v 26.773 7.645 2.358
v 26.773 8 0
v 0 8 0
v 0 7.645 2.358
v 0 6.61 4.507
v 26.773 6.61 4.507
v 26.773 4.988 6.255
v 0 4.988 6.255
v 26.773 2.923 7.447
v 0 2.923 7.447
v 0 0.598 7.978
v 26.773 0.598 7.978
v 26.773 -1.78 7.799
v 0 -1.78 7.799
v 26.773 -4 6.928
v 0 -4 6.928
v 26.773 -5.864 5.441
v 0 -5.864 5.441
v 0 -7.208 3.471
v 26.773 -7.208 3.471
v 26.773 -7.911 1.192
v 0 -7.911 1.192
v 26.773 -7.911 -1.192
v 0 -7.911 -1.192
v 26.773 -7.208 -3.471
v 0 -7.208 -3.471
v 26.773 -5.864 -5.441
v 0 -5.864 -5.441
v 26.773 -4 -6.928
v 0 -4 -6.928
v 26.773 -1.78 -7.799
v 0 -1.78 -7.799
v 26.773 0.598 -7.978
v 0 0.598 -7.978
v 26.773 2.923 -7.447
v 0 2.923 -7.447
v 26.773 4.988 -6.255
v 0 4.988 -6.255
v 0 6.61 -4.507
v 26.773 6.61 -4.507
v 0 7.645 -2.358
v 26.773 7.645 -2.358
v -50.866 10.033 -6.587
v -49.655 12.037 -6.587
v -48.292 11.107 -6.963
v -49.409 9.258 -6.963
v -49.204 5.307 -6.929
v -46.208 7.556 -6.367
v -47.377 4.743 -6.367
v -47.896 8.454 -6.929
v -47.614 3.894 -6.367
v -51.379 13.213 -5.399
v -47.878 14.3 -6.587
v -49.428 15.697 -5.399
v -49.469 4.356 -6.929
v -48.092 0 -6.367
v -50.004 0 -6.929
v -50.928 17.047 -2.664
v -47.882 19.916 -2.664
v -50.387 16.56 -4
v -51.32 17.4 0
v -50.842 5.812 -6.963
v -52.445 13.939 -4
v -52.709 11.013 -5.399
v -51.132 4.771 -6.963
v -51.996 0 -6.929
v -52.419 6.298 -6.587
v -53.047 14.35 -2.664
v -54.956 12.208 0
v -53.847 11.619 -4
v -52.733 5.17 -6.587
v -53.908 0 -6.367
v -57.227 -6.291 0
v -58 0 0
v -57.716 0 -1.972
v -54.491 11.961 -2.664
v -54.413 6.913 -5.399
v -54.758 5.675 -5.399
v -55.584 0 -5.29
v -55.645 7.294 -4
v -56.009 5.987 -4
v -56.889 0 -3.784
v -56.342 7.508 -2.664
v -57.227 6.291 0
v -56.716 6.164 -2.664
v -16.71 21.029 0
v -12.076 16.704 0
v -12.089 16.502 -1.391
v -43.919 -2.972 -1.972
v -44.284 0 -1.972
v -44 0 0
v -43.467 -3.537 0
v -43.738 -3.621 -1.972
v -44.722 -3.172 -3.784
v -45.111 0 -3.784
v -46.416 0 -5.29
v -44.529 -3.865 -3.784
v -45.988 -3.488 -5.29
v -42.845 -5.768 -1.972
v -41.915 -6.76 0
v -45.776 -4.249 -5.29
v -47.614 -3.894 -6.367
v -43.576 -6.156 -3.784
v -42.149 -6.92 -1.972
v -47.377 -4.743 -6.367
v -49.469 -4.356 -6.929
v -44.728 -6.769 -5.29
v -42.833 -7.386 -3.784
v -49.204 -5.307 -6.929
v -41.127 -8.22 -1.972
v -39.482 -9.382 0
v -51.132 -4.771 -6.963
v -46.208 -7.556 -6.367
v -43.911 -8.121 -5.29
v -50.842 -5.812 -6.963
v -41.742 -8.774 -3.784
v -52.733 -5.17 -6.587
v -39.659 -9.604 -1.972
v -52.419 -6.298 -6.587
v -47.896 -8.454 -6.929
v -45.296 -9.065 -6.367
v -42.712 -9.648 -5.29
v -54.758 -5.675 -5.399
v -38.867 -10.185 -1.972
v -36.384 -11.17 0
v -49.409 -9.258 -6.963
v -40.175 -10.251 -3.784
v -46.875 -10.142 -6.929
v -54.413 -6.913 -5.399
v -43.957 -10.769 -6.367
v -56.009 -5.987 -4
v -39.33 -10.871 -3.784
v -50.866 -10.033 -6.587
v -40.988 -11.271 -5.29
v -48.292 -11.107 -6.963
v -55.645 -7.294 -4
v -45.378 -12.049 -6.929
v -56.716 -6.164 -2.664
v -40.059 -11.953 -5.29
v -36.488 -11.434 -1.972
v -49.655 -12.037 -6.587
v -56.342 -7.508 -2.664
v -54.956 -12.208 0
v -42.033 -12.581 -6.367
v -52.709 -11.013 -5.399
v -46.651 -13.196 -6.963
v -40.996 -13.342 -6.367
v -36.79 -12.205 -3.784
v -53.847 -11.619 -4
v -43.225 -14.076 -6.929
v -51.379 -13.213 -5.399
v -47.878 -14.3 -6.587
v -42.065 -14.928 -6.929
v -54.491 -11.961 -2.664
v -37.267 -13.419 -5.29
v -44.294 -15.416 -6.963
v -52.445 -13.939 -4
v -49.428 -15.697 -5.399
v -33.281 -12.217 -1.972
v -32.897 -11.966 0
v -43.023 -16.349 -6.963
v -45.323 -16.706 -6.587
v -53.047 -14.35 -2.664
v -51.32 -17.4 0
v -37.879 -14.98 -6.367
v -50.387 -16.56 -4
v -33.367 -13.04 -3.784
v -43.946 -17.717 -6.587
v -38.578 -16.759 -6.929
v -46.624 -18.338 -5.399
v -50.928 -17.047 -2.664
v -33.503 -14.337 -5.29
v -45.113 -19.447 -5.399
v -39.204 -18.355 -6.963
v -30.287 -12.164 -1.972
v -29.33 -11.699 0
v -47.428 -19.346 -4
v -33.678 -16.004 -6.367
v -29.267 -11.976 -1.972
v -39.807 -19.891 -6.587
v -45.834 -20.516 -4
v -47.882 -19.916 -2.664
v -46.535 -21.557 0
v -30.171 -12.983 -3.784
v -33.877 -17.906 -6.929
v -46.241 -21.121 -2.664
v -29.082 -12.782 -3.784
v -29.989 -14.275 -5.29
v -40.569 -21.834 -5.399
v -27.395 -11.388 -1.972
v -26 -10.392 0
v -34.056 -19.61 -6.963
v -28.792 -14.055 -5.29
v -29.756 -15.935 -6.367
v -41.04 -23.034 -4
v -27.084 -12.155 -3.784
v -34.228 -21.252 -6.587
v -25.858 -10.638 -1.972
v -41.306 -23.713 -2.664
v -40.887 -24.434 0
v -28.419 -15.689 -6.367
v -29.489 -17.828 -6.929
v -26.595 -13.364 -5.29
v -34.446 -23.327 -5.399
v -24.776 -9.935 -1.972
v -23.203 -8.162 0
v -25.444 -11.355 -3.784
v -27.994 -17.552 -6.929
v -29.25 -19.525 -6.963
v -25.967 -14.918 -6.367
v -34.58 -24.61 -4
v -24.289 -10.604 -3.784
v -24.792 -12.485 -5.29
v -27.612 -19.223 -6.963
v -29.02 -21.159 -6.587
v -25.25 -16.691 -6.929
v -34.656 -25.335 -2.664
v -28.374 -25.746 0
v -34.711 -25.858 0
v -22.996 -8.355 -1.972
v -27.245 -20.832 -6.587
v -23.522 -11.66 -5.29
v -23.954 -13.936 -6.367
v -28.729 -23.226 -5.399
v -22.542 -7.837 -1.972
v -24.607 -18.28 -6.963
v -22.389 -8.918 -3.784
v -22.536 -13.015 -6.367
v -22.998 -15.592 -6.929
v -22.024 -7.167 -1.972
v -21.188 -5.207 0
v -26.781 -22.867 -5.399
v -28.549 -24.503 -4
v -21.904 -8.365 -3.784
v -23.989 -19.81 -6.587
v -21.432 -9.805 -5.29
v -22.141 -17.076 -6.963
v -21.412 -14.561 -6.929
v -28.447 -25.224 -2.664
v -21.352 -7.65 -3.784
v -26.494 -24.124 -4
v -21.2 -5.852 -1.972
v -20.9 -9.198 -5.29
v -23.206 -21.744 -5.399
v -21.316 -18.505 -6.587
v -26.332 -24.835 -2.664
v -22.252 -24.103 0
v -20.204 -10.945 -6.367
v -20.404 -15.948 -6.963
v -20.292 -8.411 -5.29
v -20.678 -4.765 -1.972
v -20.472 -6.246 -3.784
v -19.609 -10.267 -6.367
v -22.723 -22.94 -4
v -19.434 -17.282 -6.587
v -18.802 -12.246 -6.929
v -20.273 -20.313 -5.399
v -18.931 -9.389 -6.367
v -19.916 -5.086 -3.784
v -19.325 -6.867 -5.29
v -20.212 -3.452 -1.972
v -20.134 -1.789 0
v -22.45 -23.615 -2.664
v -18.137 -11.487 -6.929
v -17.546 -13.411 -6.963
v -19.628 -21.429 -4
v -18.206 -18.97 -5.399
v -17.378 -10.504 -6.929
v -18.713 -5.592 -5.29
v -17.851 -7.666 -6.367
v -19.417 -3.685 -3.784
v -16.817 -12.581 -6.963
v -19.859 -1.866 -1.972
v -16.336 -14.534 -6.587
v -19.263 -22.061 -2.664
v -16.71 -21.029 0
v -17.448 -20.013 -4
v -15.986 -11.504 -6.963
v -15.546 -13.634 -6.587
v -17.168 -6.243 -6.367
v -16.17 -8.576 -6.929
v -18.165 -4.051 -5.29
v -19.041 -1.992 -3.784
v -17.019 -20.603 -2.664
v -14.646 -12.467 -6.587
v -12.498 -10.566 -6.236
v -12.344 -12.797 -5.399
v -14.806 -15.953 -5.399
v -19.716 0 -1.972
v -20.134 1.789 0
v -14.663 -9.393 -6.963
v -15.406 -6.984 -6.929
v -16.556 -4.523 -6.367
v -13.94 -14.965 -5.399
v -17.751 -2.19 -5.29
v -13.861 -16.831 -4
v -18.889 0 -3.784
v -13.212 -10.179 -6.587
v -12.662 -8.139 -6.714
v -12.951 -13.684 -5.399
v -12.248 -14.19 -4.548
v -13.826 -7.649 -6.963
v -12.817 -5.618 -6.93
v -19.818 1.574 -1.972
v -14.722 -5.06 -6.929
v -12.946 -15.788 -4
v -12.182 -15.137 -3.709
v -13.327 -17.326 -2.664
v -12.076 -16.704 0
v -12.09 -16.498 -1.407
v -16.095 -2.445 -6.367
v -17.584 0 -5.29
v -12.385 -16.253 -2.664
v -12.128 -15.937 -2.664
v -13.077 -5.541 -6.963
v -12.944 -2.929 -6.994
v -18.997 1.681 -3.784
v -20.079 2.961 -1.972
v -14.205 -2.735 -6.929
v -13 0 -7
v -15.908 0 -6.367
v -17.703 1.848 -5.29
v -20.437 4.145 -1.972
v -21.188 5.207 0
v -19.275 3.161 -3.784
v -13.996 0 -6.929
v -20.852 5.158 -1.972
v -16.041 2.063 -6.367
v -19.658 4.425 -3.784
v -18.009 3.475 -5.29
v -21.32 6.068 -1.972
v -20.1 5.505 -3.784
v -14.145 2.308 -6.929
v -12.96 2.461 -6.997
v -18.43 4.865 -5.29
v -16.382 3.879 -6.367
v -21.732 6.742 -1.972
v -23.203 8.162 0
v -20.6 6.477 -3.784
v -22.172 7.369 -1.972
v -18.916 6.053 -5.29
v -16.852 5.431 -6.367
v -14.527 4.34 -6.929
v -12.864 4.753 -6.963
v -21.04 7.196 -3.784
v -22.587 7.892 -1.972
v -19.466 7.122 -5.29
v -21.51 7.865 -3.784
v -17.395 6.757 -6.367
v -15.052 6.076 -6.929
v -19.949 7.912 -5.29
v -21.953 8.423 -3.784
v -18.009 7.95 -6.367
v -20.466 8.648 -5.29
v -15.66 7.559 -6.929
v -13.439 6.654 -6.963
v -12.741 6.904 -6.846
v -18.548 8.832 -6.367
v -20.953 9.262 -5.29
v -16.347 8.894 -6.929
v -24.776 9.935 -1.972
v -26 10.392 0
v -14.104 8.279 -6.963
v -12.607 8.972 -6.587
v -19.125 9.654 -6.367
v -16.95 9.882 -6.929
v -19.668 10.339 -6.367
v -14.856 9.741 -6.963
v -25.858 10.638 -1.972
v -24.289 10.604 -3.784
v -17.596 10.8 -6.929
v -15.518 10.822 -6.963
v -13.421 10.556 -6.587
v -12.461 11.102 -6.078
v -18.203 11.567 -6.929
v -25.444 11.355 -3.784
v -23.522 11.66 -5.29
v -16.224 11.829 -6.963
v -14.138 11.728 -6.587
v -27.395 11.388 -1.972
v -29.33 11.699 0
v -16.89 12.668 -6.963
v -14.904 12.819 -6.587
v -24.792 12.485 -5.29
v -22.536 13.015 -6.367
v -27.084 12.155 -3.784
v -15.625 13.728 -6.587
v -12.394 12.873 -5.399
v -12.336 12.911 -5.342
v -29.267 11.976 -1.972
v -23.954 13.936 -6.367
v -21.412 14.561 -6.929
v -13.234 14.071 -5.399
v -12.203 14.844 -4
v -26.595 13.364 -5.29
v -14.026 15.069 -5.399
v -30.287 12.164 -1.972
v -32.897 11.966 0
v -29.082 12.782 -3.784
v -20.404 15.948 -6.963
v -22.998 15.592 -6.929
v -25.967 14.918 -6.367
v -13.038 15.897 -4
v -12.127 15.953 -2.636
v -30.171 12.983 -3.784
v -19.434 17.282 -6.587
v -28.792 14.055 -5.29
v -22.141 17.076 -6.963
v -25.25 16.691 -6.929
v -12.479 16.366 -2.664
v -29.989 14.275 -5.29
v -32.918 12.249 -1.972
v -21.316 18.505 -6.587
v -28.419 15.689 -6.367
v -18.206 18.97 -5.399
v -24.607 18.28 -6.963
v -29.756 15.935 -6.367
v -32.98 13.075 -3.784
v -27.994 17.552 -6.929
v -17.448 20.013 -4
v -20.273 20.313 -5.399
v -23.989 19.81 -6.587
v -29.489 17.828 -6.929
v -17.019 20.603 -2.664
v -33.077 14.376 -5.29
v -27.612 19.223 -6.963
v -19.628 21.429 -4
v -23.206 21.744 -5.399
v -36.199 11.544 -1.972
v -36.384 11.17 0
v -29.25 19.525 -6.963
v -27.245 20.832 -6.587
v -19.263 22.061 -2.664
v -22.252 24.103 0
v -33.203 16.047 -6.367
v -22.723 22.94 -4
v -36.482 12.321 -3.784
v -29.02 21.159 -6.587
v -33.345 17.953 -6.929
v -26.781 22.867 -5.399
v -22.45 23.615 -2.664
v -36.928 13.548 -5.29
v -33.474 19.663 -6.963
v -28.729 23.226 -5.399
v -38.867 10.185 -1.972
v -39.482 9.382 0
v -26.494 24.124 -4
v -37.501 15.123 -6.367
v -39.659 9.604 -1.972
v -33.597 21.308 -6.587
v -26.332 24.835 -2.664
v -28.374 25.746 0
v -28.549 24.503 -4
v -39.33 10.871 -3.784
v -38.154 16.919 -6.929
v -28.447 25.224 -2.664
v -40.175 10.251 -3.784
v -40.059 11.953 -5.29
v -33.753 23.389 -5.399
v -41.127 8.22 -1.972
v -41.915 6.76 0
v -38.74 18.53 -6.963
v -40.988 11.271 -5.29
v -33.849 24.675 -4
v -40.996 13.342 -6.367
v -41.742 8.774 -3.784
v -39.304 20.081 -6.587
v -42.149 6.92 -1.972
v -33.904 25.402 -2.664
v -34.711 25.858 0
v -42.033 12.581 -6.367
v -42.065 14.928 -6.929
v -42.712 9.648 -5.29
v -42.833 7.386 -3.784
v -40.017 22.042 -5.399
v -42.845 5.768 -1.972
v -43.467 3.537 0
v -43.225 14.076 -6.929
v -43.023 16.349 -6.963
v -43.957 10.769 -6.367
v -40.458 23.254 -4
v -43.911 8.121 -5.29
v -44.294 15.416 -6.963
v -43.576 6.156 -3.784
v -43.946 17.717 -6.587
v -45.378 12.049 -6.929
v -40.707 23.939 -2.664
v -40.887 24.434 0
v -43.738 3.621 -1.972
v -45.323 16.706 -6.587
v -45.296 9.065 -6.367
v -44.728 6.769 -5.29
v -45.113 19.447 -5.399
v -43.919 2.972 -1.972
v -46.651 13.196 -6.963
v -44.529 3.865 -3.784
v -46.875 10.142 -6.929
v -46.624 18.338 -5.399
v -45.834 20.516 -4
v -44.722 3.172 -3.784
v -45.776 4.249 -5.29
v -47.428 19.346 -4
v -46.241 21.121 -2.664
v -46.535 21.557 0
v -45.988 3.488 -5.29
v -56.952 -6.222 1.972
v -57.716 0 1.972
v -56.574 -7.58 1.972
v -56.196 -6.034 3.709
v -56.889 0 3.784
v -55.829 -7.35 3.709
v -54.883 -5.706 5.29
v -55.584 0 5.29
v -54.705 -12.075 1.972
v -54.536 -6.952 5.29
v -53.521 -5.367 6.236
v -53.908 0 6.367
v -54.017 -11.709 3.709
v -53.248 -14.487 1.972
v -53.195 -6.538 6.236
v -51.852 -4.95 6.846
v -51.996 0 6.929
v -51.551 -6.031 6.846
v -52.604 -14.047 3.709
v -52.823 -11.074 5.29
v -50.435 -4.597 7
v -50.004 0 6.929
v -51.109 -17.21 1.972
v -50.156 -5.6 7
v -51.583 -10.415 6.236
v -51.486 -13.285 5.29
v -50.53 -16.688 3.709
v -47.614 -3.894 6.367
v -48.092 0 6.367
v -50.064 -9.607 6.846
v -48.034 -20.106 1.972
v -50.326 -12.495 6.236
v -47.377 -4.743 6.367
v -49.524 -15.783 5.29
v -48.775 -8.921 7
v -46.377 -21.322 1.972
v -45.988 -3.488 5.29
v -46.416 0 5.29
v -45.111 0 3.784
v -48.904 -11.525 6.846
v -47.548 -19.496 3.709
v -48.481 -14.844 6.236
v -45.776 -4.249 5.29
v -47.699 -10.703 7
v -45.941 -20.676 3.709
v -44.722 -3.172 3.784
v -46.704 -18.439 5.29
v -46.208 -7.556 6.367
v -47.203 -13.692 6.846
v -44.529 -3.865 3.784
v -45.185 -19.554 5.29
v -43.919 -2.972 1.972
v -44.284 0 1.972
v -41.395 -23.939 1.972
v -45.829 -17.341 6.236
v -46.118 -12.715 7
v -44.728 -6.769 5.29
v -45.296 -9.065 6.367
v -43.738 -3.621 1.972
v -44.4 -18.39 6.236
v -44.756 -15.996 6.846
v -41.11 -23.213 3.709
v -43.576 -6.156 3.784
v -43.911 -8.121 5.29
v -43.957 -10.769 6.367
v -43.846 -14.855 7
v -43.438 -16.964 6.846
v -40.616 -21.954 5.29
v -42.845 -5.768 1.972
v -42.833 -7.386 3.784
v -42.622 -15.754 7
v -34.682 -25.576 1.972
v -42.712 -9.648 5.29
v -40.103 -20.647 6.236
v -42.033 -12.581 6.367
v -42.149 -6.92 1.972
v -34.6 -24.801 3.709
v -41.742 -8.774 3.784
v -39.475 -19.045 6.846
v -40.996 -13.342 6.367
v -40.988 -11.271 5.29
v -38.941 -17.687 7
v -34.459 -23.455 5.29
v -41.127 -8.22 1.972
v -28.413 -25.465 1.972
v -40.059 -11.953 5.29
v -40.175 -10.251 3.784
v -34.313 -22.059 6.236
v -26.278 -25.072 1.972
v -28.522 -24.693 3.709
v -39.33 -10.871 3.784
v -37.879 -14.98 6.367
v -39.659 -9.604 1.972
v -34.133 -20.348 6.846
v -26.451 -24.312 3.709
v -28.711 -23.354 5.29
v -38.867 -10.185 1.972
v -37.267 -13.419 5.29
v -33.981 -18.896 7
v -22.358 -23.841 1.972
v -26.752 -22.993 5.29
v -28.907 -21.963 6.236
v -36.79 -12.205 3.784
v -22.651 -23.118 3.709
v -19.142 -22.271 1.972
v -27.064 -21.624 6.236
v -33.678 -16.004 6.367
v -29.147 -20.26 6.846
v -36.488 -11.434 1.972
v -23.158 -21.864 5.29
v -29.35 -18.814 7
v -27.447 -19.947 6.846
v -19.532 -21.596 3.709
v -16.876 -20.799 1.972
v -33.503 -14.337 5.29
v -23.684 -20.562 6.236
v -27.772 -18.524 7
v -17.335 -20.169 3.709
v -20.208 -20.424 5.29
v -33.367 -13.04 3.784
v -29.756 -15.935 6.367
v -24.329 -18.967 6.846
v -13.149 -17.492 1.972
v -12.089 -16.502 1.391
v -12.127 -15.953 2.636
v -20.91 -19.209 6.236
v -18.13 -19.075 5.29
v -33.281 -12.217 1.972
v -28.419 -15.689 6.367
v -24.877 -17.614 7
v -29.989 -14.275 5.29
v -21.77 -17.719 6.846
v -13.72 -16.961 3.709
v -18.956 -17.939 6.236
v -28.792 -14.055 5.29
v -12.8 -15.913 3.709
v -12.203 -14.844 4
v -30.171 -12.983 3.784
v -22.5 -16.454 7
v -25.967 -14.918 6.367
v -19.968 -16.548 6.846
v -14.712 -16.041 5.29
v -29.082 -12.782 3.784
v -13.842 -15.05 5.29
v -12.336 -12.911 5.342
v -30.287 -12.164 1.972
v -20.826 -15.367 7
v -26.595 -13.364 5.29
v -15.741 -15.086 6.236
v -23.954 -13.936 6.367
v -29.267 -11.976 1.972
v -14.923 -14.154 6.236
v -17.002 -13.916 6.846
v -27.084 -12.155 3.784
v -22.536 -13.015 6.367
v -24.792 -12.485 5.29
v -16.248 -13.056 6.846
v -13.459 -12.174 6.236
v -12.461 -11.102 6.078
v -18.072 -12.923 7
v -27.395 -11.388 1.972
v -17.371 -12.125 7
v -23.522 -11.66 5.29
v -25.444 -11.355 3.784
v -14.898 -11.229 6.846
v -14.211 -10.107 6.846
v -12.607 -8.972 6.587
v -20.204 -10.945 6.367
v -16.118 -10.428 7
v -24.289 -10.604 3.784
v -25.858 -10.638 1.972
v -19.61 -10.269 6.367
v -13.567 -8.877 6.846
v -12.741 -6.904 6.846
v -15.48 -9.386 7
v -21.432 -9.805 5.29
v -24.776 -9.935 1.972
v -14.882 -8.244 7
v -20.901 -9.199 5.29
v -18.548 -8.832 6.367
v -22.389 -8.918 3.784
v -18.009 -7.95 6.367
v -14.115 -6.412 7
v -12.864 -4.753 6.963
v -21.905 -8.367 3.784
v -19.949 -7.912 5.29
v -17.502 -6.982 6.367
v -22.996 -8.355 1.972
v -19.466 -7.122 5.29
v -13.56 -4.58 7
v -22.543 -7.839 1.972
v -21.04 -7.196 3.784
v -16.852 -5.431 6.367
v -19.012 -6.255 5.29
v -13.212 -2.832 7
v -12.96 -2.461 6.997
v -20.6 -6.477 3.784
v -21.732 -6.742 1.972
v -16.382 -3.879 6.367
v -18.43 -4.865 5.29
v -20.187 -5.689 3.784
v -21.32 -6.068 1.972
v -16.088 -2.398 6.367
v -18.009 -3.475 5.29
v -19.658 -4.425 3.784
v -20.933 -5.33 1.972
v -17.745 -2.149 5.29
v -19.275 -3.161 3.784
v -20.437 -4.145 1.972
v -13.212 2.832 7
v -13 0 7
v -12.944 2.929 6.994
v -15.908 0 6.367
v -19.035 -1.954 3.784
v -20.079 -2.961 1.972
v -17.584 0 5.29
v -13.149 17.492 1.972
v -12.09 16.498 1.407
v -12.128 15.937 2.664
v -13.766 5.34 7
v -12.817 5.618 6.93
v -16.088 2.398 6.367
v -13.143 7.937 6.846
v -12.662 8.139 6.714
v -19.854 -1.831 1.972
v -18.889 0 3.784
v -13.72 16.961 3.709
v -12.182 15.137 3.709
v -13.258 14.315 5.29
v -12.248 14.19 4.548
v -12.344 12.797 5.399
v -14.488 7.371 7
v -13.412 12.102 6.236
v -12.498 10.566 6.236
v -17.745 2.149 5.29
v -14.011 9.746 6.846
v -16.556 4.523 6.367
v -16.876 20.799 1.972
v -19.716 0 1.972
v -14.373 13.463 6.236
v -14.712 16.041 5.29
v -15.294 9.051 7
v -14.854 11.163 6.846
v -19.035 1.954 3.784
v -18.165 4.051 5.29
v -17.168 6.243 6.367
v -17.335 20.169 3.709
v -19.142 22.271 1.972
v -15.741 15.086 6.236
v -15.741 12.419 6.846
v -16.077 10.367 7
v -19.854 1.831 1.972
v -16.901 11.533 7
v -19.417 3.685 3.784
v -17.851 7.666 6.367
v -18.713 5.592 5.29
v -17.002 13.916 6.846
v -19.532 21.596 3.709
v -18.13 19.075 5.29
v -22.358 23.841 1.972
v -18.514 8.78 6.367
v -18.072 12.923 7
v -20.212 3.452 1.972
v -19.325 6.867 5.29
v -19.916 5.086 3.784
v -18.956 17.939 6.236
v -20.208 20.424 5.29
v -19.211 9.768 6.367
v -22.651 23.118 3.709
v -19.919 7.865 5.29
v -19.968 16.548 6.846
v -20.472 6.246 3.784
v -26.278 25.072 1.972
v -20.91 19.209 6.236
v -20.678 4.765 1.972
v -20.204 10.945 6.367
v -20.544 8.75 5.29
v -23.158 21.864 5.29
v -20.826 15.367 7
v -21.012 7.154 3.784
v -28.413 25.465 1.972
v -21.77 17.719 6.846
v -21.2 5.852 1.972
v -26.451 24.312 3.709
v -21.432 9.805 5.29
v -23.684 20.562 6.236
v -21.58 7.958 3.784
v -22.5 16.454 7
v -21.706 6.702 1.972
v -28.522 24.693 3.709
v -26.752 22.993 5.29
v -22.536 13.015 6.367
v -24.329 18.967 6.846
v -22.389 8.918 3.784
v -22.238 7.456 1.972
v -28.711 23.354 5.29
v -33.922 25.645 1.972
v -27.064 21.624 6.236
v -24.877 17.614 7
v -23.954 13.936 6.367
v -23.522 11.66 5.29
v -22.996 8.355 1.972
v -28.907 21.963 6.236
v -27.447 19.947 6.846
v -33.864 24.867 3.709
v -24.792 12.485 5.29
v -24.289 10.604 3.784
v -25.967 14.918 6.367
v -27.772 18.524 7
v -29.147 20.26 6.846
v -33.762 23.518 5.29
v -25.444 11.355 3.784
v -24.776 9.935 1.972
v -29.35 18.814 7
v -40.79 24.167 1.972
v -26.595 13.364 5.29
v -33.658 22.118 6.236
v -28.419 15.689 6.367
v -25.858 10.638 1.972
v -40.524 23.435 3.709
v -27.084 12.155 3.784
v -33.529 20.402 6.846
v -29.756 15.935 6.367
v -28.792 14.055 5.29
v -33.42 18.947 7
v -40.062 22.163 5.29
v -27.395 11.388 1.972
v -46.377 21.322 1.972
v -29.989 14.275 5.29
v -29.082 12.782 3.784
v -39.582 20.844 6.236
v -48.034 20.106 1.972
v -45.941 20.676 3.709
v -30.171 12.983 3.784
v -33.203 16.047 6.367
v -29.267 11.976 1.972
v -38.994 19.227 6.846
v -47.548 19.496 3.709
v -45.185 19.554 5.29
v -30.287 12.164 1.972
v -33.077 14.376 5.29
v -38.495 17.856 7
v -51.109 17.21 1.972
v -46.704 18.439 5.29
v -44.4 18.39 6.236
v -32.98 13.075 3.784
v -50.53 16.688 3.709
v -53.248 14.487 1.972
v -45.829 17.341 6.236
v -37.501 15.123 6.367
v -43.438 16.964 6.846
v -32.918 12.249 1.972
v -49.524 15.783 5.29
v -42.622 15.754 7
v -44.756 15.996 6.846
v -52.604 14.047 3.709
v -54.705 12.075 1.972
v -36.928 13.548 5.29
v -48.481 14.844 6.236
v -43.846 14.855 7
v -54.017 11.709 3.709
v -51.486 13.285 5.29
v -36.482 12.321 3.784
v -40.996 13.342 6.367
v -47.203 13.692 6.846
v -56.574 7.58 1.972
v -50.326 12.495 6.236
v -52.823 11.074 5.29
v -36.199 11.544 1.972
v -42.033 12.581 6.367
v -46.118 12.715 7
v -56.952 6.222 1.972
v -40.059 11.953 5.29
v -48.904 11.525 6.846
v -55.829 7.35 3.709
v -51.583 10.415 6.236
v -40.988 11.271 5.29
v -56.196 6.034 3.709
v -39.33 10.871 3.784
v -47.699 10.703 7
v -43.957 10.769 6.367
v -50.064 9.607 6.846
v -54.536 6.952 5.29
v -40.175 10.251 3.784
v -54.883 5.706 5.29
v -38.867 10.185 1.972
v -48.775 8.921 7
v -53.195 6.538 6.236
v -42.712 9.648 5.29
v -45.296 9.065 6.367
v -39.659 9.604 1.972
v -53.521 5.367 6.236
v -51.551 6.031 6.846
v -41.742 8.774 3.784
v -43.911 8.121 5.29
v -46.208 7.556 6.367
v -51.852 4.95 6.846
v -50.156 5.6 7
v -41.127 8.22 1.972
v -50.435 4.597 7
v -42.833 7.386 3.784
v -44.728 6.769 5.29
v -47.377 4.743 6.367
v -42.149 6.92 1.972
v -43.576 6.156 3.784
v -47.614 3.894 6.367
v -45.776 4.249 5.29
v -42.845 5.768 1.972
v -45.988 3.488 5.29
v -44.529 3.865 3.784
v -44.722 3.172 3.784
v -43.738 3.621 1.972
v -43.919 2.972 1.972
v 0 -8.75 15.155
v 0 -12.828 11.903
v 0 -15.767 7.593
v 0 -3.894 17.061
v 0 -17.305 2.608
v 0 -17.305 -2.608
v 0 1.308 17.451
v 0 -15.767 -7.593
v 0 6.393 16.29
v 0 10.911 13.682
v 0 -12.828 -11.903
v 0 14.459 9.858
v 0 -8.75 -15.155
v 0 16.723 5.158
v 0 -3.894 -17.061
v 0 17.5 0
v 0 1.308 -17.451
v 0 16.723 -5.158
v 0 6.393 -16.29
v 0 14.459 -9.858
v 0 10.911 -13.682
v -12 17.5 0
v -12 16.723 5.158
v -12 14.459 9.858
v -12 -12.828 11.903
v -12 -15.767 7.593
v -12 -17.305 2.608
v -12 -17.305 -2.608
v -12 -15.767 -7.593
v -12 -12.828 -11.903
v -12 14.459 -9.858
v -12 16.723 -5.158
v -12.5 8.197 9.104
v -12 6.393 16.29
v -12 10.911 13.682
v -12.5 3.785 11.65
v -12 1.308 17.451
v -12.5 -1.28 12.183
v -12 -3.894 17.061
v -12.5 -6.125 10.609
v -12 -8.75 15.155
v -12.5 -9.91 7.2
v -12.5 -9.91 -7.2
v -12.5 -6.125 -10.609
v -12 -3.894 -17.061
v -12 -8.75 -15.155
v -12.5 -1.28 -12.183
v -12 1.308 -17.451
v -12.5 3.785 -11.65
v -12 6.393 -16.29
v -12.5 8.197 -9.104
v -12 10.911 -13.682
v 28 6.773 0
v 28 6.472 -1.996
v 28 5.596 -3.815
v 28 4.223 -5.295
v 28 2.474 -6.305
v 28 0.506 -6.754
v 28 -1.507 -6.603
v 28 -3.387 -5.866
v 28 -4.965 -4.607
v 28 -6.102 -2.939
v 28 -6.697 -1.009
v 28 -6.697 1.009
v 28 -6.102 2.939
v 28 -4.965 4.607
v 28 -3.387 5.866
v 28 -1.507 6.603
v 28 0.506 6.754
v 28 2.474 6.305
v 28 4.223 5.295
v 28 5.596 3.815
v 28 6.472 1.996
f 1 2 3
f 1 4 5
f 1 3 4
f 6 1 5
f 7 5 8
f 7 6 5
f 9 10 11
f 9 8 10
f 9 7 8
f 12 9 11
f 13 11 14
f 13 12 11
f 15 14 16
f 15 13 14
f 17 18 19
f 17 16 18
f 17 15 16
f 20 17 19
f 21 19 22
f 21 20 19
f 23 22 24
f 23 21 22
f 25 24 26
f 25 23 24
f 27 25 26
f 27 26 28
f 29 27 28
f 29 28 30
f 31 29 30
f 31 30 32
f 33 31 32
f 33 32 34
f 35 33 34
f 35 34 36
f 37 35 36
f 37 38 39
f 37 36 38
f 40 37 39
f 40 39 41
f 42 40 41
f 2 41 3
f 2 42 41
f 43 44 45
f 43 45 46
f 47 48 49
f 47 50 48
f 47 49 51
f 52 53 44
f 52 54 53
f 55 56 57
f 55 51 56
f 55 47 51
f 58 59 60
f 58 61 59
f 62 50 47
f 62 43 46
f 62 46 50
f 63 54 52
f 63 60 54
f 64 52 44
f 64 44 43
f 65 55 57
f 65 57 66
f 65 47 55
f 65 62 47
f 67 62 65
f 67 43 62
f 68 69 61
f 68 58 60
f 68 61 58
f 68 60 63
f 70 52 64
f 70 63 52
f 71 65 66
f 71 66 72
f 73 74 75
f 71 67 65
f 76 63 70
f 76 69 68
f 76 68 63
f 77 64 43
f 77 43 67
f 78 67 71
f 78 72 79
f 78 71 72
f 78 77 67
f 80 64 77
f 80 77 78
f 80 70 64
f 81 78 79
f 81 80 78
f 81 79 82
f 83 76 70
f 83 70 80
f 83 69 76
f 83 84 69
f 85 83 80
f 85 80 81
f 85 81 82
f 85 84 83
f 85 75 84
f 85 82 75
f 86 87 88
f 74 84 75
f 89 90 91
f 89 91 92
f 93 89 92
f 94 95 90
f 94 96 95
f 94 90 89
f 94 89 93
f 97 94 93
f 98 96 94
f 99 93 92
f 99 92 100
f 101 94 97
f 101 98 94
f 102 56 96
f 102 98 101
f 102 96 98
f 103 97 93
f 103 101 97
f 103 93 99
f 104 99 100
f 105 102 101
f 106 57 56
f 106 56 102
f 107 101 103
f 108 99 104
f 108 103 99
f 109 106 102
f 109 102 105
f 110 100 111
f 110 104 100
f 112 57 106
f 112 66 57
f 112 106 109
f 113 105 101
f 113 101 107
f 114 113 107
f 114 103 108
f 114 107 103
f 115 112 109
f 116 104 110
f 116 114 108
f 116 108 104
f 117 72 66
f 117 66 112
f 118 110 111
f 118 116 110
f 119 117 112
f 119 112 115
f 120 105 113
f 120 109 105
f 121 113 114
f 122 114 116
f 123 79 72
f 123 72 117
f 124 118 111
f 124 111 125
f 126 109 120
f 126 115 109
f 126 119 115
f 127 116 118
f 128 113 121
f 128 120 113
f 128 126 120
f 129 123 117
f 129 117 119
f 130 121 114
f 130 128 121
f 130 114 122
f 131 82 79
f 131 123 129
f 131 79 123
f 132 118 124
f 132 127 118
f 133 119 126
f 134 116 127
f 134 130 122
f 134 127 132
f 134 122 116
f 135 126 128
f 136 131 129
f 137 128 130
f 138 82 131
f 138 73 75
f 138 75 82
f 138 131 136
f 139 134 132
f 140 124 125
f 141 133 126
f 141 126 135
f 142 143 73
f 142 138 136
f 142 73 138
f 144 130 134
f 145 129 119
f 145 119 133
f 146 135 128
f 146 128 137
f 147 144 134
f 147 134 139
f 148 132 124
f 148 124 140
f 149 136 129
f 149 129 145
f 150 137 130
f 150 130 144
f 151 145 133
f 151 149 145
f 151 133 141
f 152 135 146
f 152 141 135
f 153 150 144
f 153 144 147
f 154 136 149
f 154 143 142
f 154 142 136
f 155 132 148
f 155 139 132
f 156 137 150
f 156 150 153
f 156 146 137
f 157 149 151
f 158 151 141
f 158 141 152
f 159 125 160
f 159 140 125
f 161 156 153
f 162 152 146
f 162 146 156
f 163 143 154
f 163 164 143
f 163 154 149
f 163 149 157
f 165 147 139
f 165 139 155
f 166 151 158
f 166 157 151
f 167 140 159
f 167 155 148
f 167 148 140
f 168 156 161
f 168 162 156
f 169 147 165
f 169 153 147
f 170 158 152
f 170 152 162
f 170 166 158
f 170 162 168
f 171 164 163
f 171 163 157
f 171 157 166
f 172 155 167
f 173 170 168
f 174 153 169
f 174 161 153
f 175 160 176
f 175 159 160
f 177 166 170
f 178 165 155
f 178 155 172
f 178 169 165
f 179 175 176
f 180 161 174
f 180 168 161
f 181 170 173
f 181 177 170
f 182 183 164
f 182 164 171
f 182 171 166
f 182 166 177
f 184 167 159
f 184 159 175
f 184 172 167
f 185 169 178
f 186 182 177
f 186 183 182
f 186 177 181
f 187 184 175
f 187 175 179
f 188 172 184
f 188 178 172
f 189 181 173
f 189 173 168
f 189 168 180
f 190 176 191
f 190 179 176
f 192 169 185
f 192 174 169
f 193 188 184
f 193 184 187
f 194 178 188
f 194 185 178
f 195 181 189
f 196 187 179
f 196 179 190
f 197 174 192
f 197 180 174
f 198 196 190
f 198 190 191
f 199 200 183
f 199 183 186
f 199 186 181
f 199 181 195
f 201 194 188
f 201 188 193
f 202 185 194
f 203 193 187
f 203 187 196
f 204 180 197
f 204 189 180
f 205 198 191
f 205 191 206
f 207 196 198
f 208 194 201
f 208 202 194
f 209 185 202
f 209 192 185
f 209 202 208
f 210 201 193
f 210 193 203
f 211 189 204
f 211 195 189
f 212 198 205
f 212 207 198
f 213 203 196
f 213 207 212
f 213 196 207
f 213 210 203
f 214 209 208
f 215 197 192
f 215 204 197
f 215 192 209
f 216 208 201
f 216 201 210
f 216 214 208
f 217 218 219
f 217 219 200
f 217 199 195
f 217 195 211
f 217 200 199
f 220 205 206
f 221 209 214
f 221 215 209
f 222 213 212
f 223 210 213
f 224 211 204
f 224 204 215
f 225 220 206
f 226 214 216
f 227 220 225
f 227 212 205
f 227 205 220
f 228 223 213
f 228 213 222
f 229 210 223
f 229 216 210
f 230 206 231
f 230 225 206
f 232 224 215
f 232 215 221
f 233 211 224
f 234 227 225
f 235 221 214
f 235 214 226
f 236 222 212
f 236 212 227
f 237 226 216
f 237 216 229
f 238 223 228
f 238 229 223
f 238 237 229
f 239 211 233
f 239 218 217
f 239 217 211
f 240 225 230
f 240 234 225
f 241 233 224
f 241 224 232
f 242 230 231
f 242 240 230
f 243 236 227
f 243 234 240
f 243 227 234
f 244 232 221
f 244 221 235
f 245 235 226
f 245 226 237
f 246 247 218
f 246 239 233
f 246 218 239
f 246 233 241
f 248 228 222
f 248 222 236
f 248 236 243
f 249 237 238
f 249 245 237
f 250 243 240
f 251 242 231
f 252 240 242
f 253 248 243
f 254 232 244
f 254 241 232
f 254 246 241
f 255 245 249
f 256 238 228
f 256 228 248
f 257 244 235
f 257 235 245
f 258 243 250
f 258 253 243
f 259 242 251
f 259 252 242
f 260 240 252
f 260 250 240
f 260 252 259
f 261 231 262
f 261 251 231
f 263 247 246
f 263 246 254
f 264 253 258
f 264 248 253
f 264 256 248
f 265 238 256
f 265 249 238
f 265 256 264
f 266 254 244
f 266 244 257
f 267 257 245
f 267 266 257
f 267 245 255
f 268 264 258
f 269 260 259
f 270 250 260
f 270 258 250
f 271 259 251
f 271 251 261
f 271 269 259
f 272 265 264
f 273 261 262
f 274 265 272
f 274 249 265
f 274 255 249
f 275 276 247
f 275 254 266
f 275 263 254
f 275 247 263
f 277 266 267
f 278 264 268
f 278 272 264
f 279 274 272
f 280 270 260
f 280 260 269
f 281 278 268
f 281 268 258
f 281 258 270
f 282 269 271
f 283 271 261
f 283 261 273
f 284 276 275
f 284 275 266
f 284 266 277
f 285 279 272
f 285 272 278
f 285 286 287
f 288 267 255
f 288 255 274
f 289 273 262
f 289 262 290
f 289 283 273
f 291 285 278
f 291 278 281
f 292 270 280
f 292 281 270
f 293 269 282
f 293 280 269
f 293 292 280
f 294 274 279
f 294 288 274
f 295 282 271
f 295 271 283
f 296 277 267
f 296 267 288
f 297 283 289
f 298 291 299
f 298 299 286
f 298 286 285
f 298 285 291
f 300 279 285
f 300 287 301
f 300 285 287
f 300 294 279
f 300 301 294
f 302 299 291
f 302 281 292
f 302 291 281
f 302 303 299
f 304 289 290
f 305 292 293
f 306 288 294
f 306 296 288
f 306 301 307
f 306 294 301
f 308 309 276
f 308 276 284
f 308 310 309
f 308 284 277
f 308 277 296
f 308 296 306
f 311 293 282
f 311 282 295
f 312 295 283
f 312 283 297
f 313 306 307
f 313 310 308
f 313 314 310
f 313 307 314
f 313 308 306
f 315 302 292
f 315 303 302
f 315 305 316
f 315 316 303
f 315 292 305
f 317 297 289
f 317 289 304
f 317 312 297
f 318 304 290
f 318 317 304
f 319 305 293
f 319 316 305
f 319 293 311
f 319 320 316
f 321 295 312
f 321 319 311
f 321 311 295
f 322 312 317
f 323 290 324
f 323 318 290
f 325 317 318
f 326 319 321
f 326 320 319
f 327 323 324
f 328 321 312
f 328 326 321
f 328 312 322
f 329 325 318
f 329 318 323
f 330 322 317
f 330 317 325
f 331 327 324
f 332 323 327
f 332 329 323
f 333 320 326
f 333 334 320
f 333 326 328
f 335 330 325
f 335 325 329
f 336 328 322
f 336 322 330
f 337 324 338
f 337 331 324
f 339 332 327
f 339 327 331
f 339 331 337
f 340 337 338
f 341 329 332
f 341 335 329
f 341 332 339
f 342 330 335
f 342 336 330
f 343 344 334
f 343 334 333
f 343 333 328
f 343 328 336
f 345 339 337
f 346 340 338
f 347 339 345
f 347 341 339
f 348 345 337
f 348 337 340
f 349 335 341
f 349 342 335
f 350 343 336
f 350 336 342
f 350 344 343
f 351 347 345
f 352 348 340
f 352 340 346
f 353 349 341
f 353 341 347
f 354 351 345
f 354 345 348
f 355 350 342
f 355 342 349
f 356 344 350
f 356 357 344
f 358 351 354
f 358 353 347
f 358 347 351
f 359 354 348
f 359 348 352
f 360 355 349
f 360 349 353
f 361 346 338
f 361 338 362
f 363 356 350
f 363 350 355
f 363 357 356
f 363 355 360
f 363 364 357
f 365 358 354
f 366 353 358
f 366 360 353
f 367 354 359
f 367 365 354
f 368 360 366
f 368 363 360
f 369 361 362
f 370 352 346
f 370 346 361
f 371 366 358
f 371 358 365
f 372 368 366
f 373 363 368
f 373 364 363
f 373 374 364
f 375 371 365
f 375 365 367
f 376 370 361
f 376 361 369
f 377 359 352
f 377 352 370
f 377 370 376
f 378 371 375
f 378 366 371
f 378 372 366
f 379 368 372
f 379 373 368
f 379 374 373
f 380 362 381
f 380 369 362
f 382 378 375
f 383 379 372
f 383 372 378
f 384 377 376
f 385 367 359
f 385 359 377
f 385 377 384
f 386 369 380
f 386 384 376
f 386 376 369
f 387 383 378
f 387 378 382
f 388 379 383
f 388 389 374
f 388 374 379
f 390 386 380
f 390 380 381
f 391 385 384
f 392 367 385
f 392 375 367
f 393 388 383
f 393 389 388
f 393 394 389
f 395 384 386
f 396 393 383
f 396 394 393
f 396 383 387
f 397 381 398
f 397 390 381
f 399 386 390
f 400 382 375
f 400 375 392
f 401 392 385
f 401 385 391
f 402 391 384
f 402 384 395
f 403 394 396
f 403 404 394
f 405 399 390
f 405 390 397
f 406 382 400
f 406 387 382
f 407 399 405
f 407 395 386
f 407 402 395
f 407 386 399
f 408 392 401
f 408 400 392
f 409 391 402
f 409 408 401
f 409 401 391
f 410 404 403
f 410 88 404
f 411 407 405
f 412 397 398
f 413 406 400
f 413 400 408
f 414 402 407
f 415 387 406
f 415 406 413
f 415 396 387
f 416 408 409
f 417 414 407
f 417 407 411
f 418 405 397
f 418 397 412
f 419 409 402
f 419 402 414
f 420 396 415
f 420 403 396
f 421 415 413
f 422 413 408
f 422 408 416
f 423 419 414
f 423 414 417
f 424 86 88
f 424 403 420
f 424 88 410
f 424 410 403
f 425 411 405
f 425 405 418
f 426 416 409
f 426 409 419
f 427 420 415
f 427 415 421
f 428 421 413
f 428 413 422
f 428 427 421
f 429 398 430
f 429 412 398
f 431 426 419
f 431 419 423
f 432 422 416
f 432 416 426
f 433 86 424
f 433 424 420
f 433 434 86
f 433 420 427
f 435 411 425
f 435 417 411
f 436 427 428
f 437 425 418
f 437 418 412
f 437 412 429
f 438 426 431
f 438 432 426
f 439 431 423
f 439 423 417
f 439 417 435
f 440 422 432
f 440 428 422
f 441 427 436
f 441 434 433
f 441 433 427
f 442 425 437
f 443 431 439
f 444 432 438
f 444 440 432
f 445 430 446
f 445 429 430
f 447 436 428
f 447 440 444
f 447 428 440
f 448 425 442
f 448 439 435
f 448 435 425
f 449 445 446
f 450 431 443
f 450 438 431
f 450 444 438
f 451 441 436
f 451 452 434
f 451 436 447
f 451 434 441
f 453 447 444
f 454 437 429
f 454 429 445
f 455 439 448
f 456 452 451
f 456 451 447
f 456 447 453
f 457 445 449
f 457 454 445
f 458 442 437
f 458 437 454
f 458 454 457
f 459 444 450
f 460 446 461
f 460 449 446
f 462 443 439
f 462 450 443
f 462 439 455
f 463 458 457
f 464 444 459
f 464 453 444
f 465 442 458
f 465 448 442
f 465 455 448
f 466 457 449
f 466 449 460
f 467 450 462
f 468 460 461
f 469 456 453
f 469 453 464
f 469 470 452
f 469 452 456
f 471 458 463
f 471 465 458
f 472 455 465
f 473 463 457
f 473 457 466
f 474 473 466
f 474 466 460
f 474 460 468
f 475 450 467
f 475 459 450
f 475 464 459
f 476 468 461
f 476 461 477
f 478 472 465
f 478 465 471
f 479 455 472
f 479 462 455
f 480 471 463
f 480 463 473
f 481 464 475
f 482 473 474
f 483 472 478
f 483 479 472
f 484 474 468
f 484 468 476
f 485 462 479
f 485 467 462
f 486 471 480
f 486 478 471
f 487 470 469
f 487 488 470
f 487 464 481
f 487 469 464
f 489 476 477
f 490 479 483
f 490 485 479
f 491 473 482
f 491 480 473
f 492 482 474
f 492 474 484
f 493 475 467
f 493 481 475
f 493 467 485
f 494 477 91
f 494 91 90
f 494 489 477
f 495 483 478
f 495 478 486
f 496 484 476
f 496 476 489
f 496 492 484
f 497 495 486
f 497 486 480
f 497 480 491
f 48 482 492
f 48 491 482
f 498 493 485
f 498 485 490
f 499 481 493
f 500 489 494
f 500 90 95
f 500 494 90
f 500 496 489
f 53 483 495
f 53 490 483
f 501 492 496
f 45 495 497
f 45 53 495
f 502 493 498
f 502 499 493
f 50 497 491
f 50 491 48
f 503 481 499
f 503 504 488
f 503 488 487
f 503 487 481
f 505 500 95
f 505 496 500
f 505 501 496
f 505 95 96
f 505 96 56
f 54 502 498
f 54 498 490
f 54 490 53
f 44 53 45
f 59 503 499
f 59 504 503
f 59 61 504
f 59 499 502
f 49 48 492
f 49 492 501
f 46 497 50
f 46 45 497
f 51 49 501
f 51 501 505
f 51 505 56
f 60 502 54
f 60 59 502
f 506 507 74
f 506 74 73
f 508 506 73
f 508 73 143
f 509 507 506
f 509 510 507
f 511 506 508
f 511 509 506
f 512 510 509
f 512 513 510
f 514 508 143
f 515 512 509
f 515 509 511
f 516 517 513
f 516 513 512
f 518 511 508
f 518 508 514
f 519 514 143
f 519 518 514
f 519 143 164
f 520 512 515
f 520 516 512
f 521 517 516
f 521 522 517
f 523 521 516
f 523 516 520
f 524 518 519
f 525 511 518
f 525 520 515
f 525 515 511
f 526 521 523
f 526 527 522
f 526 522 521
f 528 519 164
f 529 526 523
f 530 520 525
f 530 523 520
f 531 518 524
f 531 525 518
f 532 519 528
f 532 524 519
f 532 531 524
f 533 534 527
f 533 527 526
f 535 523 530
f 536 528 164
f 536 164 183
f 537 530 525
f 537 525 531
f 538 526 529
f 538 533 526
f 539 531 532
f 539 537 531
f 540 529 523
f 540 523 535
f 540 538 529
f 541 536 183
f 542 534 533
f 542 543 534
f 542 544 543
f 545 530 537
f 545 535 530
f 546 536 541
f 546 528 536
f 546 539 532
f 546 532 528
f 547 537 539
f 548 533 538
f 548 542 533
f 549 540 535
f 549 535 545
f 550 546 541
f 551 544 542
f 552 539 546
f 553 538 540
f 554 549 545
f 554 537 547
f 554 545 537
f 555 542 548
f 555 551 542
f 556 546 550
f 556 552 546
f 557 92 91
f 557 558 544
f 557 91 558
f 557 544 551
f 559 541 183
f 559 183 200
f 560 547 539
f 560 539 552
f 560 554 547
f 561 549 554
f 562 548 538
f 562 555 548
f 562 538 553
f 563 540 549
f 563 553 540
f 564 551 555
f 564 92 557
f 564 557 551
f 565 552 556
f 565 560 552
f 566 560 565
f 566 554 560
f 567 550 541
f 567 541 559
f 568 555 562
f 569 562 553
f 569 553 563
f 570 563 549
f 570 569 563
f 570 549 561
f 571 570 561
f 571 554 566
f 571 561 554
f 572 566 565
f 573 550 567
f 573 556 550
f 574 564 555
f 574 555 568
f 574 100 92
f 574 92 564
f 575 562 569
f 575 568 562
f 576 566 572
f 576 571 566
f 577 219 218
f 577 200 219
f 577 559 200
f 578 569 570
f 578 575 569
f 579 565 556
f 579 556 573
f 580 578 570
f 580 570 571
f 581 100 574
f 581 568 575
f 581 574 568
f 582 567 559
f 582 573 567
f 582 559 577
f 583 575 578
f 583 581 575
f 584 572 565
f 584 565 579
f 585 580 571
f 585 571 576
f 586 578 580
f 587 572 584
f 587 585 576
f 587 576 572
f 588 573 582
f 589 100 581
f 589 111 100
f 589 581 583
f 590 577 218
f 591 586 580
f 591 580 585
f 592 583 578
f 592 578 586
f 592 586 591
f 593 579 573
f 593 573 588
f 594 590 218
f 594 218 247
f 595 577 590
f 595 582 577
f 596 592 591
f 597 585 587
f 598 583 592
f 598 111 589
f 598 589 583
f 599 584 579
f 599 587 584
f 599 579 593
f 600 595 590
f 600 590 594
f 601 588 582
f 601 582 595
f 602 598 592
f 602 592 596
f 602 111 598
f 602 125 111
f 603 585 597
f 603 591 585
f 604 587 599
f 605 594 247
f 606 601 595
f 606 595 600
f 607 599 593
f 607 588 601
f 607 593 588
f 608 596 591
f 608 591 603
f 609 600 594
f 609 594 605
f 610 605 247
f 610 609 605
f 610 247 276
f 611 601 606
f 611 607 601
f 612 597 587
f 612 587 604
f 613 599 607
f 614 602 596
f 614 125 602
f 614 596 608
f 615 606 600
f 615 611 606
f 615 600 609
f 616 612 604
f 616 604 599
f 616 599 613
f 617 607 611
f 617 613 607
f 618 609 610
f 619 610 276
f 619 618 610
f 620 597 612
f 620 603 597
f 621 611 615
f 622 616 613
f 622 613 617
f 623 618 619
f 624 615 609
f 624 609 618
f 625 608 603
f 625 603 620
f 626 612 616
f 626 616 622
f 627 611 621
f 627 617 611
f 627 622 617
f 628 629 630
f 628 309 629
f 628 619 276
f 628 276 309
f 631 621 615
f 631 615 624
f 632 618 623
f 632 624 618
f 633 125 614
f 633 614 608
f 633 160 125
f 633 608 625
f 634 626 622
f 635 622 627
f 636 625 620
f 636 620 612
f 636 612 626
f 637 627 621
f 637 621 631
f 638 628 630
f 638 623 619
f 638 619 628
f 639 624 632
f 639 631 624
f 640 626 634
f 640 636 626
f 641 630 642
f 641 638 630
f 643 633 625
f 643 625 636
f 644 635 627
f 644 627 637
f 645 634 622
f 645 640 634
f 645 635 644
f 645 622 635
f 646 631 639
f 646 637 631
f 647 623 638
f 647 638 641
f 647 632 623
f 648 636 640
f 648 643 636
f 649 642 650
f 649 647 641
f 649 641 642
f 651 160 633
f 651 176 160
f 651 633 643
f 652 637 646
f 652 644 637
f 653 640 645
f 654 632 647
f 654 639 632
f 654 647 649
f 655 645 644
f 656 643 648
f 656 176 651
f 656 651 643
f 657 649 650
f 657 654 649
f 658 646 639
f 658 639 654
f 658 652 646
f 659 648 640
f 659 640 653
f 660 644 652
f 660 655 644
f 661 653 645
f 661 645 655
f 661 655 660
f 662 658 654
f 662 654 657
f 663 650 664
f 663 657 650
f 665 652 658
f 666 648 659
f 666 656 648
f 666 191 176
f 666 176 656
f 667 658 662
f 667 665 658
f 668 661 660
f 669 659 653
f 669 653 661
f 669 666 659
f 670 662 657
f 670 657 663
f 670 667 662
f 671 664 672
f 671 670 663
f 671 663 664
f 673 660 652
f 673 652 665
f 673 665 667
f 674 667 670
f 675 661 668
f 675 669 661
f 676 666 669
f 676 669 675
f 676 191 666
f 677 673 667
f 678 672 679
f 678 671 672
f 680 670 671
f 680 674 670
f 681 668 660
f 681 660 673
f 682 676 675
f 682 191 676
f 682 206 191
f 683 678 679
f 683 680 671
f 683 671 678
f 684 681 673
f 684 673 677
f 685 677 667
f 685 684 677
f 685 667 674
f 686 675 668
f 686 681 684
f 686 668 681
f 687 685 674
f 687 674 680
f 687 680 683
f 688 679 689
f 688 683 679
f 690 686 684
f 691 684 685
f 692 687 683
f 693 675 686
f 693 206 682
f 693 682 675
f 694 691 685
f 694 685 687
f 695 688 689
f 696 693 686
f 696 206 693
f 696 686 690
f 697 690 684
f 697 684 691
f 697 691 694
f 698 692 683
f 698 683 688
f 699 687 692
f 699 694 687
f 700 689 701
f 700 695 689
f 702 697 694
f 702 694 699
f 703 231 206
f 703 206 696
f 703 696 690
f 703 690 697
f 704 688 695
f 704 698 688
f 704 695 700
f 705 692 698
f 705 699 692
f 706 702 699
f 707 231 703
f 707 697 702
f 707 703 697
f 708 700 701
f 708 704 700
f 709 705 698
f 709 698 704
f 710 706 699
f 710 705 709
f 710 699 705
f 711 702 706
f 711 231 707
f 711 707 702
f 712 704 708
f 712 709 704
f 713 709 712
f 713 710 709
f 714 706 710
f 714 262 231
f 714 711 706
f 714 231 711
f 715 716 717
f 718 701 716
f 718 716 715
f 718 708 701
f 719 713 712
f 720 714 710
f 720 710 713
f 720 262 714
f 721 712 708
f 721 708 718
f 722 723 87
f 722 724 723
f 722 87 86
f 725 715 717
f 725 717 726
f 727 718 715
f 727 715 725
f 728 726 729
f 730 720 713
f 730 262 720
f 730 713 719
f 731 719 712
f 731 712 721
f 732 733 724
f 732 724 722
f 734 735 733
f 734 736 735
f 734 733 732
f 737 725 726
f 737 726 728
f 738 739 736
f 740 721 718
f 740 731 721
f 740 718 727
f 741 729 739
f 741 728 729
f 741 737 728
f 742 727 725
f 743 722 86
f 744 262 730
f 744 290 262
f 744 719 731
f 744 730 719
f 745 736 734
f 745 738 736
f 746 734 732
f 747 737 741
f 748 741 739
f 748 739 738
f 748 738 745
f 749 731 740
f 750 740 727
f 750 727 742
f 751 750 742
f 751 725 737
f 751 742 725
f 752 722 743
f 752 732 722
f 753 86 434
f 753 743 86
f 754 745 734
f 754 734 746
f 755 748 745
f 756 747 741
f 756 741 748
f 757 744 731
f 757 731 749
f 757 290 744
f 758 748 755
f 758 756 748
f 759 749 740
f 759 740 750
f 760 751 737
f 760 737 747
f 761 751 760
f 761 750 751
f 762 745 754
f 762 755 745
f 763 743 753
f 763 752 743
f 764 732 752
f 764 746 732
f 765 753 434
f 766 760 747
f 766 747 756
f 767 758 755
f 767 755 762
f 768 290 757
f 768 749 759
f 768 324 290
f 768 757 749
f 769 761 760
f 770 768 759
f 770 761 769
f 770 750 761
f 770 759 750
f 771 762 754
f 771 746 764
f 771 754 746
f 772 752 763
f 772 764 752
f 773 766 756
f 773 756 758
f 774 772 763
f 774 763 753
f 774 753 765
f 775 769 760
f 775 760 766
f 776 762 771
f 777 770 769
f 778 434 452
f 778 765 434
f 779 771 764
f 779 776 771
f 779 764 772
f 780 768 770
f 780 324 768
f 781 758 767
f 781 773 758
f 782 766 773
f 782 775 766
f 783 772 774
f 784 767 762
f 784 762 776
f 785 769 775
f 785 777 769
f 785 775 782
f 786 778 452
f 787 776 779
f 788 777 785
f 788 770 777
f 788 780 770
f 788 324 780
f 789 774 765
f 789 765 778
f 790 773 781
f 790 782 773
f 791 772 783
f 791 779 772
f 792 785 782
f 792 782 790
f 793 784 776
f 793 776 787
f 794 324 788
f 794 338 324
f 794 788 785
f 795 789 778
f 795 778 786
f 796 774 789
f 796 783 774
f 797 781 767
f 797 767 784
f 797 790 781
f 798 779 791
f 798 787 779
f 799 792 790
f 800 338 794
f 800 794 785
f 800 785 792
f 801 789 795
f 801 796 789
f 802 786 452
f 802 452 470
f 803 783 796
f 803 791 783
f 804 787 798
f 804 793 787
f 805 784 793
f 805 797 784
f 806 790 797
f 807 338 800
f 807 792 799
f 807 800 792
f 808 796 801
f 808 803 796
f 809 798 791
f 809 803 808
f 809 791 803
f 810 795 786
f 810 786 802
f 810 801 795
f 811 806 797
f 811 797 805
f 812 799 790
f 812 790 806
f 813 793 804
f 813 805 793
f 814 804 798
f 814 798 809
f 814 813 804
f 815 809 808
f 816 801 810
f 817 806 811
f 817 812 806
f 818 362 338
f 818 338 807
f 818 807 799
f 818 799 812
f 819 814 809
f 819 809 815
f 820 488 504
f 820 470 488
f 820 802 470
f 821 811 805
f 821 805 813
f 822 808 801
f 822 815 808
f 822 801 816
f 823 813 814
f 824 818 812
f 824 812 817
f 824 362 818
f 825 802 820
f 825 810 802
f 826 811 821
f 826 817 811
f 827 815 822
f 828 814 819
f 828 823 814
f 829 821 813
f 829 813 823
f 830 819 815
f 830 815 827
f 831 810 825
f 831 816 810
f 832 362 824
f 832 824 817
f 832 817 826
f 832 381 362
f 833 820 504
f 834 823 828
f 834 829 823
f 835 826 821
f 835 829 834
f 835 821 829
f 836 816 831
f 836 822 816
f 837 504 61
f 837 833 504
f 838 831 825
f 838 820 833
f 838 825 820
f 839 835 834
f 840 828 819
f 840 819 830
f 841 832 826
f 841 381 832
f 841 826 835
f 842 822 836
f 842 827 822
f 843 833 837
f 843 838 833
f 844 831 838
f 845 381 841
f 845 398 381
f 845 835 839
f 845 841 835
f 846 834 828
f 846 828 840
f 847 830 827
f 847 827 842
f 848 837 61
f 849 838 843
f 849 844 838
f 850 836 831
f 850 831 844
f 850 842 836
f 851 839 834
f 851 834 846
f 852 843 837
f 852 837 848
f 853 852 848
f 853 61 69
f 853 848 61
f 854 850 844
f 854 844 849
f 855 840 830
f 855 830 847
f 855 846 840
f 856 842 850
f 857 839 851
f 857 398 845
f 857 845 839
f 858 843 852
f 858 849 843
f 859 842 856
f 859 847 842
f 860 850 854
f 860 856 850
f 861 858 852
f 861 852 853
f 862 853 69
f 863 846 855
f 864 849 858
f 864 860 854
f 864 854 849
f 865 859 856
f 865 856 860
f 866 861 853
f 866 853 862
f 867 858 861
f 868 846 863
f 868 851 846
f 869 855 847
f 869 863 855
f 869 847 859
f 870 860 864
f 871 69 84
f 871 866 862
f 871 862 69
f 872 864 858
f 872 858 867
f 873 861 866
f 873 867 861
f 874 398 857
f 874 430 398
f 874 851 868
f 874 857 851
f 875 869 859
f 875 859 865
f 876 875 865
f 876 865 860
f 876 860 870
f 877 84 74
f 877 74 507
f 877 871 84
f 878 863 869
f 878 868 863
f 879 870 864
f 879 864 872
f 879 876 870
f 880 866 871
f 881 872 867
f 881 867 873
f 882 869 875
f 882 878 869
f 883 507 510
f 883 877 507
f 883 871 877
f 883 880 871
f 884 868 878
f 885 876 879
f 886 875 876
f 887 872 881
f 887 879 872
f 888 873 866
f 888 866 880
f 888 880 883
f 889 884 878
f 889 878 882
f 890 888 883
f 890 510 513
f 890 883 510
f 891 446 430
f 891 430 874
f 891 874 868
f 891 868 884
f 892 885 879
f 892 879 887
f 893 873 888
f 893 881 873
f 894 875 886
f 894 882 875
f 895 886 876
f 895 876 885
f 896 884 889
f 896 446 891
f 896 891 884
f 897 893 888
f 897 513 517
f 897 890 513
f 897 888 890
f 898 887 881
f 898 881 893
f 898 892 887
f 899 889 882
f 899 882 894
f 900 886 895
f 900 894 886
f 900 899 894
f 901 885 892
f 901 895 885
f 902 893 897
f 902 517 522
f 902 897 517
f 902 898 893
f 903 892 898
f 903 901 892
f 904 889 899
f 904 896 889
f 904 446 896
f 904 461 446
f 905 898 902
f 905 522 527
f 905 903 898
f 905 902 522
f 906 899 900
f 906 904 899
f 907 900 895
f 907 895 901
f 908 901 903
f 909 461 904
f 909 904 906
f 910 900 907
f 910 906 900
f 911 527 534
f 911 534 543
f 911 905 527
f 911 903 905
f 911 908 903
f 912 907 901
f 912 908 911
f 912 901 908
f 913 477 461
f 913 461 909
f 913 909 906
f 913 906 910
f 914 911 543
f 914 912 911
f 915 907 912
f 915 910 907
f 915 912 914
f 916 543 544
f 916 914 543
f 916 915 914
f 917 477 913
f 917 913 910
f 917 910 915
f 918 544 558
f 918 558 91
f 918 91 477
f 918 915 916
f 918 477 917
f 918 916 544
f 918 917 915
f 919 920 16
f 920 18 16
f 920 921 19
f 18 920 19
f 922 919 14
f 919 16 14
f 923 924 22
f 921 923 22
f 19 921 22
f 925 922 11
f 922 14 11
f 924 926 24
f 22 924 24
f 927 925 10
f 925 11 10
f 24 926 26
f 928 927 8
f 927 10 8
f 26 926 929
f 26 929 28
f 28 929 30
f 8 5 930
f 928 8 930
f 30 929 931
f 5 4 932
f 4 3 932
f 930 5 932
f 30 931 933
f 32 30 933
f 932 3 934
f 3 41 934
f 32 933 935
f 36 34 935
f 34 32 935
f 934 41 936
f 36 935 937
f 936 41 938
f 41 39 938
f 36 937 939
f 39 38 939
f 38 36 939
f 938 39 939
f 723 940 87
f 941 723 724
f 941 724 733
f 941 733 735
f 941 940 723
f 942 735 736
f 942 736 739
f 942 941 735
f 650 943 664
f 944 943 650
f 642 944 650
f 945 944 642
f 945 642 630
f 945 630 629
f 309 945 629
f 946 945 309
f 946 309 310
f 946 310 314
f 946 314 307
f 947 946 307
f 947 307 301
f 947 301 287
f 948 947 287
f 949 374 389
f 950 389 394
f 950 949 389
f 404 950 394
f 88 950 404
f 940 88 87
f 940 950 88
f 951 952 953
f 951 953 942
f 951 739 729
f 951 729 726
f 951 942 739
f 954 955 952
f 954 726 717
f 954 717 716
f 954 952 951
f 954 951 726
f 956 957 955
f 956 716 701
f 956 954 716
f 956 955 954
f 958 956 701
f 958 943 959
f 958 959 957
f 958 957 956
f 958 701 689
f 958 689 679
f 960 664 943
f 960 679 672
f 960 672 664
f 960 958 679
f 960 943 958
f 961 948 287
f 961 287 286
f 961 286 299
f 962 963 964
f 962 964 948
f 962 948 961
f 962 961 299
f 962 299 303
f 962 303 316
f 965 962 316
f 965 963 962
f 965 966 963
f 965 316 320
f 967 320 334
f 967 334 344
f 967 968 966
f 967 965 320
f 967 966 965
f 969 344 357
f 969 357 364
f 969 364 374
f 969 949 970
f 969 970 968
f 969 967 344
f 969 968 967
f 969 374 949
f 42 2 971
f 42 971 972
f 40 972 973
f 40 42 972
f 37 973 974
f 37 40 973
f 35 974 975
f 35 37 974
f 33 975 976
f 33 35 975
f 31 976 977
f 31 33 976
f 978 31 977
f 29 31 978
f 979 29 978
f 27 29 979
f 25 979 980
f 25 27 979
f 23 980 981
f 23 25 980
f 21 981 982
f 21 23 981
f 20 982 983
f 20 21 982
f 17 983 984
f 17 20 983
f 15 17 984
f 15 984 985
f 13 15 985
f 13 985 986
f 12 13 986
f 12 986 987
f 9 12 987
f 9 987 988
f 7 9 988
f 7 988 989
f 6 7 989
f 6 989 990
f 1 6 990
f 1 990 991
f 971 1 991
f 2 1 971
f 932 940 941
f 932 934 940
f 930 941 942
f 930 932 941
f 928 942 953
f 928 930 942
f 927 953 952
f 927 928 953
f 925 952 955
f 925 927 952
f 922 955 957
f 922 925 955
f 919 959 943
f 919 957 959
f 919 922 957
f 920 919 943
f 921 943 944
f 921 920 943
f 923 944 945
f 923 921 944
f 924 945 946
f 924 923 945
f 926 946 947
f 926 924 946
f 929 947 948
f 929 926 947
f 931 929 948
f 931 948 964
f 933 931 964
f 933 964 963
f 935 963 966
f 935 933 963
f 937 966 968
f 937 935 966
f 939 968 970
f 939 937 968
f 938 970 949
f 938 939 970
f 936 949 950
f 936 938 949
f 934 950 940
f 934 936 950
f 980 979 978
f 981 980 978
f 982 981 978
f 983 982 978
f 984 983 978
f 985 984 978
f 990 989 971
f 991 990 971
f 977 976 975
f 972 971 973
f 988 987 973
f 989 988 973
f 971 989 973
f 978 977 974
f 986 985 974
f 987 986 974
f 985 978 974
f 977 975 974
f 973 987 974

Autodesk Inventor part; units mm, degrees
ref_plane "YZ Plane" through (0, 0, 0) normal (1, 0, 0) x (0, 1, 0)
sketch "Szkic1" plane through (0, 0, 0) normal (0, 0, 1) x (1, 0, 0)
  line L0 (-13, 0) -> (-13, 7)
  line L1 (-13, 7) -> (-12, 17.5)
  line L2 (-12, 17.5) -> (0, 17.5)
  line L3 (0, 17.5) -> (0, 8)
  line L4 (0, 8) -> (28, 8)
  line L5 (28, 8) -> (28, 0)
  line L6 (28, 0) -> (-13, 0)
  line L7 (-21.2, 0) -> (36.2, 0) projected
  line L8 (0, -3.5) -> (0, 21) projected
  dimension "d0" = 16
  dimension "d1" = 35
  dimension "d2" = 28
  dimension "d3" = 12
  dimension "d4" = 14
  dimension "d15" = 13
revolve "Bryła" add sketch "Szkic1" angle 360 about axis through (28, 0, 0) along (-1, 0, 0)
thread "Gwint1" size "M16x2" class "6g" standard "ISO Metric profile" length 24
chamfer "Faza1" distance 1.2269 distance2 1.2269 1 edges at (28, -8, 0) measured on face at (28, 2.3612, -1.2393)
sketch "Szkic2" plane through (0, 0, 0) normal (0, 1, 0) x (-1, 0, 0)
  line L0 (69.6, 0) -> (-11.6, 0) projected
  line L1 (0, -9.8) -> (0, 9.8) projected
  circle A0 centre (51, 0) radius 7
  line L2 (51, 7) -> (0, 7) construction
  line L3 (51, -7) -> (0, -7) construction
  line L4 (32, 7) -> (32, -7)
  dimension "d12" = 14
  dimension "d13" = 58
  dimension "d14" = 32
revolve "Oczko" add sketch "Szkic2" angle 360 about axis through (-32, 0, 7) along (0, 0, -1)
ref_plane "Work Plane1" through (14, 0, 0) normal (0, 1, 0) x (1, 0, 0)
ref_plane "Work Plane2" through (14, 0, 0) normal (0, 0, 1) x (1, 0, 0)
equation "\"d0\" = GD"
equation "\"d1\" = LADI"
equation "\"d2\" = NLG"
equation "\"d3\" = KOH1"
equation "\"d4\" = SDR1"
equation "\"d15\" = -SD1 + KOH - 1.5 * SDR1"
equation "\"d5\" = GEL"
equation "\"d7\" = -0.5 * GD1 + 0.5 * GD"
equation "\"d8\" = GUL"
equation "\"d12\" = SDR1"
equation "\"d13\" = KOH"
equation "\"d14\" = DSH"
equation "\"NLG\" = 28"
equation "\"GD\" = NND"
equation "\"LADI\" = 35"
equation "\"KOH1\" = 12"
equation "\"KOH\" = 58"
equation "\"DSH\" = 32"
equation "\"GEL\" = 24"
equation "\"GD1\" = THREADDIA - 1.2269 * PTC"
equation "\"GUL\" = 0.61345 * PTC"
equation "\"SDR1\" = 14"
equation "\"SD1\" = 24"
equation "\"PTC\" = 2"
equation "\"GAL\" = 0.61345 * PTC"
equation "\"THREADDIA\" = 16"
equation "\"SDR2\" = SDR1"
equation "\"TOA\" = 30deg"
equation "\"RR\" = 12"
equation "\"RR2\" = 1"
equation "\"NND\" = 16"
equation "\"GAL2\" = 4"
equation "\"SD2\" = 52"
properties part number "AS 2317 - M16" material "Stal, miękka"
